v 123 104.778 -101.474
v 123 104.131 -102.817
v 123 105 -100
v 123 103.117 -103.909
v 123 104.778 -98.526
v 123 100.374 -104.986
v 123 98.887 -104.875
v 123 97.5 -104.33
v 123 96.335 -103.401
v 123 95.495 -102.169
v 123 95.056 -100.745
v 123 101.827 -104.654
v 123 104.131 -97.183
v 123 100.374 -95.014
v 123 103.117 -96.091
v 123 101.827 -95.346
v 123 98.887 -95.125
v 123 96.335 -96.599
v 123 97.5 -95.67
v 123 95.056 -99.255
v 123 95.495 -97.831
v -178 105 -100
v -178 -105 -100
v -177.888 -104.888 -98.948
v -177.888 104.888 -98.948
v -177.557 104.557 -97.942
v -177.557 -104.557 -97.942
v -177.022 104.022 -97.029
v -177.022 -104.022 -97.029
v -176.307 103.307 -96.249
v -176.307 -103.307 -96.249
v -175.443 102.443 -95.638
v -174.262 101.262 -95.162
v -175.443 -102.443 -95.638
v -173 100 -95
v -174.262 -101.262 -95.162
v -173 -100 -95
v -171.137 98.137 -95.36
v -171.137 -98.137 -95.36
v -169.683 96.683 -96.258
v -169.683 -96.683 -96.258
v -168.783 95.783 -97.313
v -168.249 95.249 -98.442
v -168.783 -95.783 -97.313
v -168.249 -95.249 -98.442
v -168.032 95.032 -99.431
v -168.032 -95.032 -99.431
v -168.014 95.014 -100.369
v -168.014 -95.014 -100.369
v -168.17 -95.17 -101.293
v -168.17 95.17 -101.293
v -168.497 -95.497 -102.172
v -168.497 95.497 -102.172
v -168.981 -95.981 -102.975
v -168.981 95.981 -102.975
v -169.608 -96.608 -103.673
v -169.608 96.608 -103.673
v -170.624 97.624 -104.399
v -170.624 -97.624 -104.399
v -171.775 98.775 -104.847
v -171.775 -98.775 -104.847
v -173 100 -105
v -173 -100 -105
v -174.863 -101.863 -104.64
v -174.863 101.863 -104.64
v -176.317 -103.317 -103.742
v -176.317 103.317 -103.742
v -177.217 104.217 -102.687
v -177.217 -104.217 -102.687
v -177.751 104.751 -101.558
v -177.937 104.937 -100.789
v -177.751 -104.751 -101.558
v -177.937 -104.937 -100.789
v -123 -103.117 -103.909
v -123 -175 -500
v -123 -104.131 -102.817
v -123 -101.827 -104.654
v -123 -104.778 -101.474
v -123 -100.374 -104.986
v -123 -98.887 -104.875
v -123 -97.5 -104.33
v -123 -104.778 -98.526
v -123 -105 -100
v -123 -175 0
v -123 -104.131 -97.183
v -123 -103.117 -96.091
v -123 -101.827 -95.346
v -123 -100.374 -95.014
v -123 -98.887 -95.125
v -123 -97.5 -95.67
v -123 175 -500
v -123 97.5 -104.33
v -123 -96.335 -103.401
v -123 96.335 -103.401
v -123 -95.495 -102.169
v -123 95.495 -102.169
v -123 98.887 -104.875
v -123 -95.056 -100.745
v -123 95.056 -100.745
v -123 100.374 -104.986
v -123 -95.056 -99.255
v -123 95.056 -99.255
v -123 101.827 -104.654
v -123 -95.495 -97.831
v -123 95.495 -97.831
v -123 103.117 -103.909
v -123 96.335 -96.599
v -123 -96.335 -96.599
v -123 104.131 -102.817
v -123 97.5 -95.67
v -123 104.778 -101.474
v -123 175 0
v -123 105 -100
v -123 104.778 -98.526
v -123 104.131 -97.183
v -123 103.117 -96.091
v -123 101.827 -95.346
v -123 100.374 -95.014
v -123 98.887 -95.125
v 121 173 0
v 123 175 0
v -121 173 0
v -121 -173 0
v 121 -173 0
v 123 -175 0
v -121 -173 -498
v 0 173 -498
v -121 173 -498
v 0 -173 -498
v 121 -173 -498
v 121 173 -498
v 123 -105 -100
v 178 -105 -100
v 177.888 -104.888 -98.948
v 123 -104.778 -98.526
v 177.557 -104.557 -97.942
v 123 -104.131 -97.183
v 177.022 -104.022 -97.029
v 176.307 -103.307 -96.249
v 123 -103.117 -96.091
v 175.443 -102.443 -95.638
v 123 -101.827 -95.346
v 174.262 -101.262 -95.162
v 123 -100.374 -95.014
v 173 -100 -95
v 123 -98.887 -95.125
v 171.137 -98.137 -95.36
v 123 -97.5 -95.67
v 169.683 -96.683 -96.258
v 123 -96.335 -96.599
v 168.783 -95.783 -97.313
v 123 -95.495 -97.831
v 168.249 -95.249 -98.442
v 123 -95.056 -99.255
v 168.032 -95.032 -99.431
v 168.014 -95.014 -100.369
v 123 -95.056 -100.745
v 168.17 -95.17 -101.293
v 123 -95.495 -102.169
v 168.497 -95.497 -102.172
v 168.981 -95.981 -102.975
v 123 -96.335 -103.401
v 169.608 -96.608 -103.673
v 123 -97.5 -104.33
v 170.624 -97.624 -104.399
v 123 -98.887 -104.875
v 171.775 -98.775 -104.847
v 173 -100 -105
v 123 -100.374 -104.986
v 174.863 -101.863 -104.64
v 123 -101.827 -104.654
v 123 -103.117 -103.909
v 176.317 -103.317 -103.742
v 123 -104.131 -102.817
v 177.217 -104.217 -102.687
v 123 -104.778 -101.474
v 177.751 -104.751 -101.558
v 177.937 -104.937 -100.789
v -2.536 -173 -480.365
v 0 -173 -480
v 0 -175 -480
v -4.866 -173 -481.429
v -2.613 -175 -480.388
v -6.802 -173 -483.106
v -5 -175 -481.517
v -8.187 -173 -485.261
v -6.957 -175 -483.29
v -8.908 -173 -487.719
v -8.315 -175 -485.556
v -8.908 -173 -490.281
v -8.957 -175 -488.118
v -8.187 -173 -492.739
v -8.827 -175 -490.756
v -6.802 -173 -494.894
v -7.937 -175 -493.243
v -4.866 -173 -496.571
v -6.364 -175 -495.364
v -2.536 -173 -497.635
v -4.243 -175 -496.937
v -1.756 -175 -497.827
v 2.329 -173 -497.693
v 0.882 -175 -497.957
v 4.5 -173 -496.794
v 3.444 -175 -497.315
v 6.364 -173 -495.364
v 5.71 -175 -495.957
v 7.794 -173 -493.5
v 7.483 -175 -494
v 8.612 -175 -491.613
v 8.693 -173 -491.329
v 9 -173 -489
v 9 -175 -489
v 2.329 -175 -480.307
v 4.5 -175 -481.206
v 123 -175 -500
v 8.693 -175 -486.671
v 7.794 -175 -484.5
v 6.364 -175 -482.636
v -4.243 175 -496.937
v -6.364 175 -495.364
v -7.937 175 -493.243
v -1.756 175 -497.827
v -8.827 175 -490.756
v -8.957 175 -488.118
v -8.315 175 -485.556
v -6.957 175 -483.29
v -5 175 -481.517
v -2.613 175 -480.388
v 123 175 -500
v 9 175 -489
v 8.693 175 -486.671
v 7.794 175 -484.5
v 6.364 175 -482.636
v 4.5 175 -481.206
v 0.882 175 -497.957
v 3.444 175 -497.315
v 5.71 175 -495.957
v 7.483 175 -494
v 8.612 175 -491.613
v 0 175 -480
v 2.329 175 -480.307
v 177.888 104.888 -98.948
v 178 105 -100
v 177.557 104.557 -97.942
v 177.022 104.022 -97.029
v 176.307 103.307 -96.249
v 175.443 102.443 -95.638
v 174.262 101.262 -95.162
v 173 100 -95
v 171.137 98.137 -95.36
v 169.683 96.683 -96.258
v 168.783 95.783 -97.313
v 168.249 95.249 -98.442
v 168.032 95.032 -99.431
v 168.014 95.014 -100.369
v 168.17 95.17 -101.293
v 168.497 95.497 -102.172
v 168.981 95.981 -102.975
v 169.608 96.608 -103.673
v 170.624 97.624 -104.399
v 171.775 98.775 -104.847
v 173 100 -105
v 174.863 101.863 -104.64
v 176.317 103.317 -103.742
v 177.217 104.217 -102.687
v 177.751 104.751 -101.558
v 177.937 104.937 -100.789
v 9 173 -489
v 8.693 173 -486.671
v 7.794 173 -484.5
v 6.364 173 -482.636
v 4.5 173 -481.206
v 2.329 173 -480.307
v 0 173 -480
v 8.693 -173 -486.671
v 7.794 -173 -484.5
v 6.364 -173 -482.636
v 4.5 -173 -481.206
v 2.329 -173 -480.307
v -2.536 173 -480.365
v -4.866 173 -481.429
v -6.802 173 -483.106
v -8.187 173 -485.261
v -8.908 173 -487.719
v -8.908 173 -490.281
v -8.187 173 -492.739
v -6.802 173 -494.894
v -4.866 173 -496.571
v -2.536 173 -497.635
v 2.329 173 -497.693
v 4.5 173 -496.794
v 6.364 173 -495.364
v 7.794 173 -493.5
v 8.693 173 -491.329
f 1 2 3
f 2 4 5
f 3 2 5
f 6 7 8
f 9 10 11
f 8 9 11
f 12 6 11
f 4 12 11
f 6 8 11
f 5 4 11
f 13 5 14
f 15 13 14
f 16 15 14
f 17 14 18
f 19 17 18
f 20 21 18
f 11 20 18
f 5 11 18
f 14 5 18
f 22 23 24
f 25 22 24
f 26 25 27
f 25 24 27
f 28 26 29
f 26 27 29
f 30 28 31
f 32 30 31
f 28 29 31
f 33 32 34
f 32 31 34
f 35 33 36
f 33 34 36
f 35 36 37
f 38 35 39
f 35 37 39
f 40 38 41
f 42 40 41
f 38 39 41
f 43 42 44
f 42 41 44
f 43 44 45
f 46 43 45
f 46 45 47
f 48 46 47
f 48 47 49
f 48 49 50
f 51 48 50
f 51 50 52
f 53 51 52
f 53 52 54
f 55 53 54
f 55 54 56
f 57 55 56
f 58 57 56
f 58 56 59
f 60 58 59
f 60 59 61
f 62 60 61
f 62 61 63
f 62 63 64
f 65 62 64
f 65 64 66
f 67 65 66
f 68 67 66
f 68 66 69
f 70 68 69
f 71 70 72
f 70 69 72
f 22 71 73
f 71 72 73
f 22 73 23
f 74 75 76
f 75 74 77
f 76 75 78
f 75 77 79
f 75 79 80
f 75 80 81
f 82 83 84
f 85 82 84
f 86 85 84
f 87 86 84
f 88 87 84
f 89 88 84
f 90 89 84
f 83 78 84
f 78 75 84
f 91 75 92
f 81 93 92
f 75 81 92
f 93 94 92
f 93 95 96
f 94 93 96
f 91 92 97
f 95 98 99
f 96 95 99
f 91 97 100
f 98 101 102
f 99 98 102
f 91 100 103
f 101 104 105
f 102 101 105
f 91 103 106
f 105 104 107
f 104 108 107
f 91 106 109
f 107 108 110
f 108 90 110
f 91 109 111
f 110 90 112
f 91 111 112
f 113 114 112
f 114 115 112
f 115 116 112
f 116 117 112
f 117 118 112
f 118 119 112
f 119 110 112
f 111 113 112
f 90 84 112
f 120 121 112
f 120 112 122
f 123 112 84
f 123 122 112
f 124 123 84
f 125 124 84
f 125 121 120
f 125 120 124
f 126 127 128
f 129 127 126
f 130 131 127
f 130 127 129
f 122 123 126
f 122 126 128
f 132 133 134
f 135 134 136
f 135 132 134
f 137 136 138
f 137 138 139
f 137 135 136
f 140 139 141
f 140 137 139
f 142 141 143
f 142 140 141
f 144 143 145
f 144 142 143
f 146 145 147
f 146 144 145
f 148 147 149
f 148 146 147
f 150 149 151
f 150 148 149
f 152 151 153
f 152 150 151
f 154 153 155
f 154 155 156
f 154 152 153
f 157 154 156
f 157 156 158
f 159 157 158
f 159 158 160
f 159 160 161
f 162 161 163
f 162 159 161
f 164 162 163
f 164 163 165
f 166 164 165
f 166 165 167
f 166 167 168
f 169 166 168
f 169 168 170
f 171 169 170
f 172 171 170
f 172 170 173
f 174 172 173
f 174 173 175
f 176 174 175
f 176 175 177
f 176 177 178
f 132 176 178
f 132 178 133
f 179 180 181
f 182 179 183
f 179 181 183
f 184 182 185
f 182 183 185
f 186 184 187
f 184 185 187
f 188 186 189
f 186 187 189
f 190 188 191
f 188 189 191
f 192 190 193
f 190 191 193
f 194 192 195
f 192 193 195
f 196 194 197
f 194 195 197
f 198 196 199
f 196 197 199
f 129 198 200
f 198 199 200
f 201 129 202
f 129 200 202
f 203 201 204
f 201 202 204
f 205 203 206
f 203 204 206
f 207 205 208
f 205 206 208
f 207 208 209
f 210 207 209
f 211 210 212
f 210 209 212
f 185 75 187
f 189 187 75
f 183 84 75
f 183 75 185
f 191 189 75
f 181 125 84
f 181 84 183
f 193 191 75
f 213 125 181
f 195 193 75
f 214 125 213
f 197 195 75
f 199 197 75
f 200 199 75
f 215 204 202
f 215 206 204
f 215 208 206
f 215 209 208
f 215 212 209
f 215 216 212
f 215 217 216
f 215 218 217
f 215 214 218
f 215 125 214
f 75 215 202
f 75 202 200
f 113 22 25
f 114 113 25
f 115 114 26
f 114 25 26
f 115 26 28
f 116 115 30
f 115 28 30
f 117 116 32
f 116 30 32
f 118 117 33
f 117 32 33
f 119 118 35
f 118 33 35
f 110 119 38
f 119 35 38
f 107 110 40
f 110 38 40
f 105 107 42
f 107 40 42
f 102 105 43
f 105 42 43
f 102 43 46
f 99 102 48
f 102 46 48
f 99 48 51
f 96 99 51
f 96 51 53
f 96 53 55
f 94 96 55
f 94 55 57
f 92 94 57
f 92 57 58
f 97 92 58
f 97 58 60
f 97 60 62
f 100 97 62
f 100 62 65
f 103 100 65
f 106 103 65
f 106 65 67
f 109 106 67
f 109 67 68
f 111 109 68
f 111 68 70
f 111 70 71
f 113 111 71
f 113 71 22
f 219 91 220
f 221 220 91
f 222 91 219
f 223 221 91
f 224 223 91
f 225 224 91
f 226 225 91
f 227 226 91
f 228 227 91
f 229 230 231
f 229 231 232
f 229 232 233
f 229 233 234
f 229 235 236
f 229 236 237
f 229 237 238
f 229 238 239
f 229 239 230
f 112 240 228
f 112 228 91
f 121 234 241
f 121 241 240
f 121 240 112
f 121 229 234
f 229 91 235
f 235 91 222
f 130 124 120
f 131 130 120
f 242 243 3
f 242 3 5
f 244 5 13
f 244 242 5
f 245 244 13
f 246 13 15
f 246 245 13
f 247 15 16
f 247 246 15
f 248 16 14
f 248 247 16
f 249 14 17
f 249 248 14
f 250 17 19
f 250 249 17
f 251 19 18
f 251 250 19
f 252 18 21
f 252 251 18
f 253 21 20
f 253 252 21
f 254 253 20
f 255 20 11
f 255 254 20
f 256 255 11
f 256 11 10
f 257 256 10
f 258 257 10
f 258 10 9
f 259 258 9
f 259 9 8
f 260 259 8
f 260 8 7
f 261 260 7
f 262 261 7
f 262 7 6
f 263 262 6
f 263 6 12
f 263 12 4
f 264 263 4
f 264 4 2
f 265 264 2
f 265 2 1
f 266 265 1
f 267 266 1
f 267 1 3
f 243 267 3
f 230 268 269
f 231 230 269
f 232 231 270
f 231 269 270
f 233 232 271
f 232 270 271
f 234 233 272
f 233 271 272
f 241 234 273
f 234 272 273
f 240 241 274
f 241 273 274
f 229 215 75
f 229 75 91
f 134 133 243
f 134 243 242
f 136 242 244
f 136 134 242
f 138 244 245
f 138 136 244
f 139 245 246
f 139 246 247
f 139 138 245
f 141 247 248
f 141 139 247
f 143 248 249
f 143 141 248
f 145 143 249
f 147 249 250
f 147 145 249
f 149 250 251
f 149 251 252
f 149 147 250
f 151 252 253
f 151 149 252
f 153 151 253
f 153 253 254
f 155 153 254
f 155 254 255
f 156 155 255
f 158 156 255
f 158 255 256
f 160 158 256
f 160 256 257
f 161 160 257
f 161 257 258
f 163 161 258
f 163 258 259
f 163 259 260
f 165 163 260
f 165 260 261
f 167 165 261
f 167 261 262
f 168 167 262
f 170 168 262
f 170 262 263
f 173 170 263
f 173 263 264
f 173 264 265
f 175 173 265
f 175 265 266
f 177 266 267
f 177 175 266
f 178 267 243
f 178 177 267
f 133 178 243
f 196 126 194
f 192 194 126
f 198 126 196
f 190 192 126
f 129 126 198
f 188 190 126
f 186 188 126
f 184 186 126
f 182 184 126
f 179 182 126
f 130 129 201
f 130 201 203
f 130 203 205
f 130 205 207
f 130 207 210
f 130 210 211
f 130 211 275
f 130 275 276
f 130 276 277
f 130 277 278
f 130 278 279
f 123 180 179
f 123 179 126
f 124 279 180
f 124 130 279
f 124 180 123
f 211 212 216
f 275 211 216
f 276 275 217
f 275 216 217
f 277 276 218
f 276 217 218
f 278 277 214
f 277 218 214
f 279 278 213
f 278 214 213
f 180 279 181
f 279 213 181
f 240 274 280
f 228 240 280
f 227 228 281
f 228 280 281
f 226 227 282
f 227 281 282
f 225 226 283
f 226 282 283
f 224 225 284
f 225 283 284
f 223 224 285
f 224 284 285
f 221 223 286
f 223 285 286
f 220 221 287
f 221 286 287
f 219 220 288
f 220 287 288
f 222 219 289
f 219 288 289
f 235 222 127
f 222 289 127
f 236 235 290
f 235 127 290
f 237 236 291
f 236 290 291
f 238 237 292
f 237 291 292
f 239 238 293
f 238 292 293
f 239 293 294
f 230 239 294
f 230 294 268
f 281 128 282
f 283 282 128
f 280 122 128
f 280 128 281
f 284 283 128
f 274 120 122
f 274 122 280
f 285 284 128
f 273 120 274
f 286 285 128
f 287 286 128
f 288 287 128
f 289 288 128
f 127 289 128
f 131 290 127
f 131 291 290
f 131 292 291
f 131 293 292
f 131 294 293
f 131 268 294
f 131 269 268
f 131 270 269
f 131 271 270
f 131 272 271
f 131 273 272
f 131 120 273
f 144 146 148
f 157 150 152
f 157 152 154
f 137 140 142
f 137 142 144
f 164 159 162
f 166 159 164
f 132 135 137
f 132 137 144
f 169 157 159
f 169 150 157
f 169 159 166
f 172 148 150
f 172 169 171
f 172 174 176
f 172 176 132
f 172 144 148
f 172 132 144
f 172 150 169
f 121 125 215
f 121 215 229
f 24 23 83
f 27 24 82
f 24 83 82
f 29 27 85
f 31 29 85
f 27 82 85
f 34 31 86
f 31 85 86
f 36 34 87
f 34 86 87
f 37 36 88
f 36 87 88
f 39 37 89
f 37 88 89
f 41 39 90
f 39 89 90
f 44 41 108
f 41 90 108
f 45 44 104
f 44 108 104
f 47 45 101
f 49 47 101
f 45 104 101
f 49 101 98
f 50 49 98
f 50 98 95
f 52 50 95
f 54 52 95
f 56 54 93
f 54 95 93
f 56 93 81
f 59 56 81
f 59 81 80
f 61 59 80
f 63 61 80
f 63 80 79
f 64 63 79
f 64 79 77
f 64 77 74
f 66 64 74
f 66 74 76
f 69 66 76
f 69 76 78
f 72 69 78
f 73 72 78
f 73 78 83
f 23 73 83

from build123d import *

# Parameters (mm, degrees)
F1_DEPTH  = 123
F4_DEPTH  = 2
F12_DEPTH = 500


# Not quite as in the source:
# - a feature names something its author has since deleted; it is built from what else it names


with BuildPart() as f1:
    # F0 (on Right) → F1 (new body)
    with BuildSketch(Plane.YZ):
        Polygon((175, -500), (175, 0), (173, 0), (173, -498), (-173, -498), (-173, 0), (-175, 0), (-175, -500), align=None)
    extrude(amount=F1_DEPTH)

    # F3 (on offset) → F4 (join)
    with BuildSketch(Plane.YZ.offset(123)):
        Polygon((175, 0), (0, 0), (-175, 0), (-175, -500), (175, -500), align=None)
    extrude(amount=-F4_DEPTH)

    # F9: F1, F8 across face


with BuildPart() as f8:
    # F8: sweep along a path in F7
    with BuildLine(Plane.XY.offset(-100)) as f8_path:
        Line((123, 100), (173, 100))
        Line((173, 100), (173, -100))
        Line((173, -100), (123, -100))
    # F5 (on offset) → F8 (sweep)
    with BuildSketch(Plane.YZ.offset(123)):
        with BuildLine():
            ThreePointArc((95, -100), (100, -105), (105, -100))
            ThreePointArc((105, -100), (100, -95), (95, -100))
        make_face()
    sweep(path=f8_path.line, transition=Transition.RIGHT)


with BuildPart() as f1_1:
    add(f1.part)
    add(f1.part.mirror(Plane(origin=(0, 0, -314.0074294205), x_dir=(0, 1, 0), z_dir=(-1, 0, 0))))
    add(f8.part.mirror(Plane(origin=(0, 0, -314.0074294205), x_dir=(0, 1, 0), z_dir=(-1, 0, 0))))

    # F11 (on offset) → F12 (cut)
    with BuildSketch(Plane.XZ.offset(175)):
        with BuildLine():
            ThreePointArc((0, -480), (-6.3639610307, -495.3639610307), (9, -489))
            ThreePointArc((9, -489), (6.3639610307, -482.6360389693), (0, -480))
        make_face()
    extrude(amount=-F12_DEPTH, mode=Mode.SUBTRACT)


solid = Compound([f8.part, f1_1.part])
